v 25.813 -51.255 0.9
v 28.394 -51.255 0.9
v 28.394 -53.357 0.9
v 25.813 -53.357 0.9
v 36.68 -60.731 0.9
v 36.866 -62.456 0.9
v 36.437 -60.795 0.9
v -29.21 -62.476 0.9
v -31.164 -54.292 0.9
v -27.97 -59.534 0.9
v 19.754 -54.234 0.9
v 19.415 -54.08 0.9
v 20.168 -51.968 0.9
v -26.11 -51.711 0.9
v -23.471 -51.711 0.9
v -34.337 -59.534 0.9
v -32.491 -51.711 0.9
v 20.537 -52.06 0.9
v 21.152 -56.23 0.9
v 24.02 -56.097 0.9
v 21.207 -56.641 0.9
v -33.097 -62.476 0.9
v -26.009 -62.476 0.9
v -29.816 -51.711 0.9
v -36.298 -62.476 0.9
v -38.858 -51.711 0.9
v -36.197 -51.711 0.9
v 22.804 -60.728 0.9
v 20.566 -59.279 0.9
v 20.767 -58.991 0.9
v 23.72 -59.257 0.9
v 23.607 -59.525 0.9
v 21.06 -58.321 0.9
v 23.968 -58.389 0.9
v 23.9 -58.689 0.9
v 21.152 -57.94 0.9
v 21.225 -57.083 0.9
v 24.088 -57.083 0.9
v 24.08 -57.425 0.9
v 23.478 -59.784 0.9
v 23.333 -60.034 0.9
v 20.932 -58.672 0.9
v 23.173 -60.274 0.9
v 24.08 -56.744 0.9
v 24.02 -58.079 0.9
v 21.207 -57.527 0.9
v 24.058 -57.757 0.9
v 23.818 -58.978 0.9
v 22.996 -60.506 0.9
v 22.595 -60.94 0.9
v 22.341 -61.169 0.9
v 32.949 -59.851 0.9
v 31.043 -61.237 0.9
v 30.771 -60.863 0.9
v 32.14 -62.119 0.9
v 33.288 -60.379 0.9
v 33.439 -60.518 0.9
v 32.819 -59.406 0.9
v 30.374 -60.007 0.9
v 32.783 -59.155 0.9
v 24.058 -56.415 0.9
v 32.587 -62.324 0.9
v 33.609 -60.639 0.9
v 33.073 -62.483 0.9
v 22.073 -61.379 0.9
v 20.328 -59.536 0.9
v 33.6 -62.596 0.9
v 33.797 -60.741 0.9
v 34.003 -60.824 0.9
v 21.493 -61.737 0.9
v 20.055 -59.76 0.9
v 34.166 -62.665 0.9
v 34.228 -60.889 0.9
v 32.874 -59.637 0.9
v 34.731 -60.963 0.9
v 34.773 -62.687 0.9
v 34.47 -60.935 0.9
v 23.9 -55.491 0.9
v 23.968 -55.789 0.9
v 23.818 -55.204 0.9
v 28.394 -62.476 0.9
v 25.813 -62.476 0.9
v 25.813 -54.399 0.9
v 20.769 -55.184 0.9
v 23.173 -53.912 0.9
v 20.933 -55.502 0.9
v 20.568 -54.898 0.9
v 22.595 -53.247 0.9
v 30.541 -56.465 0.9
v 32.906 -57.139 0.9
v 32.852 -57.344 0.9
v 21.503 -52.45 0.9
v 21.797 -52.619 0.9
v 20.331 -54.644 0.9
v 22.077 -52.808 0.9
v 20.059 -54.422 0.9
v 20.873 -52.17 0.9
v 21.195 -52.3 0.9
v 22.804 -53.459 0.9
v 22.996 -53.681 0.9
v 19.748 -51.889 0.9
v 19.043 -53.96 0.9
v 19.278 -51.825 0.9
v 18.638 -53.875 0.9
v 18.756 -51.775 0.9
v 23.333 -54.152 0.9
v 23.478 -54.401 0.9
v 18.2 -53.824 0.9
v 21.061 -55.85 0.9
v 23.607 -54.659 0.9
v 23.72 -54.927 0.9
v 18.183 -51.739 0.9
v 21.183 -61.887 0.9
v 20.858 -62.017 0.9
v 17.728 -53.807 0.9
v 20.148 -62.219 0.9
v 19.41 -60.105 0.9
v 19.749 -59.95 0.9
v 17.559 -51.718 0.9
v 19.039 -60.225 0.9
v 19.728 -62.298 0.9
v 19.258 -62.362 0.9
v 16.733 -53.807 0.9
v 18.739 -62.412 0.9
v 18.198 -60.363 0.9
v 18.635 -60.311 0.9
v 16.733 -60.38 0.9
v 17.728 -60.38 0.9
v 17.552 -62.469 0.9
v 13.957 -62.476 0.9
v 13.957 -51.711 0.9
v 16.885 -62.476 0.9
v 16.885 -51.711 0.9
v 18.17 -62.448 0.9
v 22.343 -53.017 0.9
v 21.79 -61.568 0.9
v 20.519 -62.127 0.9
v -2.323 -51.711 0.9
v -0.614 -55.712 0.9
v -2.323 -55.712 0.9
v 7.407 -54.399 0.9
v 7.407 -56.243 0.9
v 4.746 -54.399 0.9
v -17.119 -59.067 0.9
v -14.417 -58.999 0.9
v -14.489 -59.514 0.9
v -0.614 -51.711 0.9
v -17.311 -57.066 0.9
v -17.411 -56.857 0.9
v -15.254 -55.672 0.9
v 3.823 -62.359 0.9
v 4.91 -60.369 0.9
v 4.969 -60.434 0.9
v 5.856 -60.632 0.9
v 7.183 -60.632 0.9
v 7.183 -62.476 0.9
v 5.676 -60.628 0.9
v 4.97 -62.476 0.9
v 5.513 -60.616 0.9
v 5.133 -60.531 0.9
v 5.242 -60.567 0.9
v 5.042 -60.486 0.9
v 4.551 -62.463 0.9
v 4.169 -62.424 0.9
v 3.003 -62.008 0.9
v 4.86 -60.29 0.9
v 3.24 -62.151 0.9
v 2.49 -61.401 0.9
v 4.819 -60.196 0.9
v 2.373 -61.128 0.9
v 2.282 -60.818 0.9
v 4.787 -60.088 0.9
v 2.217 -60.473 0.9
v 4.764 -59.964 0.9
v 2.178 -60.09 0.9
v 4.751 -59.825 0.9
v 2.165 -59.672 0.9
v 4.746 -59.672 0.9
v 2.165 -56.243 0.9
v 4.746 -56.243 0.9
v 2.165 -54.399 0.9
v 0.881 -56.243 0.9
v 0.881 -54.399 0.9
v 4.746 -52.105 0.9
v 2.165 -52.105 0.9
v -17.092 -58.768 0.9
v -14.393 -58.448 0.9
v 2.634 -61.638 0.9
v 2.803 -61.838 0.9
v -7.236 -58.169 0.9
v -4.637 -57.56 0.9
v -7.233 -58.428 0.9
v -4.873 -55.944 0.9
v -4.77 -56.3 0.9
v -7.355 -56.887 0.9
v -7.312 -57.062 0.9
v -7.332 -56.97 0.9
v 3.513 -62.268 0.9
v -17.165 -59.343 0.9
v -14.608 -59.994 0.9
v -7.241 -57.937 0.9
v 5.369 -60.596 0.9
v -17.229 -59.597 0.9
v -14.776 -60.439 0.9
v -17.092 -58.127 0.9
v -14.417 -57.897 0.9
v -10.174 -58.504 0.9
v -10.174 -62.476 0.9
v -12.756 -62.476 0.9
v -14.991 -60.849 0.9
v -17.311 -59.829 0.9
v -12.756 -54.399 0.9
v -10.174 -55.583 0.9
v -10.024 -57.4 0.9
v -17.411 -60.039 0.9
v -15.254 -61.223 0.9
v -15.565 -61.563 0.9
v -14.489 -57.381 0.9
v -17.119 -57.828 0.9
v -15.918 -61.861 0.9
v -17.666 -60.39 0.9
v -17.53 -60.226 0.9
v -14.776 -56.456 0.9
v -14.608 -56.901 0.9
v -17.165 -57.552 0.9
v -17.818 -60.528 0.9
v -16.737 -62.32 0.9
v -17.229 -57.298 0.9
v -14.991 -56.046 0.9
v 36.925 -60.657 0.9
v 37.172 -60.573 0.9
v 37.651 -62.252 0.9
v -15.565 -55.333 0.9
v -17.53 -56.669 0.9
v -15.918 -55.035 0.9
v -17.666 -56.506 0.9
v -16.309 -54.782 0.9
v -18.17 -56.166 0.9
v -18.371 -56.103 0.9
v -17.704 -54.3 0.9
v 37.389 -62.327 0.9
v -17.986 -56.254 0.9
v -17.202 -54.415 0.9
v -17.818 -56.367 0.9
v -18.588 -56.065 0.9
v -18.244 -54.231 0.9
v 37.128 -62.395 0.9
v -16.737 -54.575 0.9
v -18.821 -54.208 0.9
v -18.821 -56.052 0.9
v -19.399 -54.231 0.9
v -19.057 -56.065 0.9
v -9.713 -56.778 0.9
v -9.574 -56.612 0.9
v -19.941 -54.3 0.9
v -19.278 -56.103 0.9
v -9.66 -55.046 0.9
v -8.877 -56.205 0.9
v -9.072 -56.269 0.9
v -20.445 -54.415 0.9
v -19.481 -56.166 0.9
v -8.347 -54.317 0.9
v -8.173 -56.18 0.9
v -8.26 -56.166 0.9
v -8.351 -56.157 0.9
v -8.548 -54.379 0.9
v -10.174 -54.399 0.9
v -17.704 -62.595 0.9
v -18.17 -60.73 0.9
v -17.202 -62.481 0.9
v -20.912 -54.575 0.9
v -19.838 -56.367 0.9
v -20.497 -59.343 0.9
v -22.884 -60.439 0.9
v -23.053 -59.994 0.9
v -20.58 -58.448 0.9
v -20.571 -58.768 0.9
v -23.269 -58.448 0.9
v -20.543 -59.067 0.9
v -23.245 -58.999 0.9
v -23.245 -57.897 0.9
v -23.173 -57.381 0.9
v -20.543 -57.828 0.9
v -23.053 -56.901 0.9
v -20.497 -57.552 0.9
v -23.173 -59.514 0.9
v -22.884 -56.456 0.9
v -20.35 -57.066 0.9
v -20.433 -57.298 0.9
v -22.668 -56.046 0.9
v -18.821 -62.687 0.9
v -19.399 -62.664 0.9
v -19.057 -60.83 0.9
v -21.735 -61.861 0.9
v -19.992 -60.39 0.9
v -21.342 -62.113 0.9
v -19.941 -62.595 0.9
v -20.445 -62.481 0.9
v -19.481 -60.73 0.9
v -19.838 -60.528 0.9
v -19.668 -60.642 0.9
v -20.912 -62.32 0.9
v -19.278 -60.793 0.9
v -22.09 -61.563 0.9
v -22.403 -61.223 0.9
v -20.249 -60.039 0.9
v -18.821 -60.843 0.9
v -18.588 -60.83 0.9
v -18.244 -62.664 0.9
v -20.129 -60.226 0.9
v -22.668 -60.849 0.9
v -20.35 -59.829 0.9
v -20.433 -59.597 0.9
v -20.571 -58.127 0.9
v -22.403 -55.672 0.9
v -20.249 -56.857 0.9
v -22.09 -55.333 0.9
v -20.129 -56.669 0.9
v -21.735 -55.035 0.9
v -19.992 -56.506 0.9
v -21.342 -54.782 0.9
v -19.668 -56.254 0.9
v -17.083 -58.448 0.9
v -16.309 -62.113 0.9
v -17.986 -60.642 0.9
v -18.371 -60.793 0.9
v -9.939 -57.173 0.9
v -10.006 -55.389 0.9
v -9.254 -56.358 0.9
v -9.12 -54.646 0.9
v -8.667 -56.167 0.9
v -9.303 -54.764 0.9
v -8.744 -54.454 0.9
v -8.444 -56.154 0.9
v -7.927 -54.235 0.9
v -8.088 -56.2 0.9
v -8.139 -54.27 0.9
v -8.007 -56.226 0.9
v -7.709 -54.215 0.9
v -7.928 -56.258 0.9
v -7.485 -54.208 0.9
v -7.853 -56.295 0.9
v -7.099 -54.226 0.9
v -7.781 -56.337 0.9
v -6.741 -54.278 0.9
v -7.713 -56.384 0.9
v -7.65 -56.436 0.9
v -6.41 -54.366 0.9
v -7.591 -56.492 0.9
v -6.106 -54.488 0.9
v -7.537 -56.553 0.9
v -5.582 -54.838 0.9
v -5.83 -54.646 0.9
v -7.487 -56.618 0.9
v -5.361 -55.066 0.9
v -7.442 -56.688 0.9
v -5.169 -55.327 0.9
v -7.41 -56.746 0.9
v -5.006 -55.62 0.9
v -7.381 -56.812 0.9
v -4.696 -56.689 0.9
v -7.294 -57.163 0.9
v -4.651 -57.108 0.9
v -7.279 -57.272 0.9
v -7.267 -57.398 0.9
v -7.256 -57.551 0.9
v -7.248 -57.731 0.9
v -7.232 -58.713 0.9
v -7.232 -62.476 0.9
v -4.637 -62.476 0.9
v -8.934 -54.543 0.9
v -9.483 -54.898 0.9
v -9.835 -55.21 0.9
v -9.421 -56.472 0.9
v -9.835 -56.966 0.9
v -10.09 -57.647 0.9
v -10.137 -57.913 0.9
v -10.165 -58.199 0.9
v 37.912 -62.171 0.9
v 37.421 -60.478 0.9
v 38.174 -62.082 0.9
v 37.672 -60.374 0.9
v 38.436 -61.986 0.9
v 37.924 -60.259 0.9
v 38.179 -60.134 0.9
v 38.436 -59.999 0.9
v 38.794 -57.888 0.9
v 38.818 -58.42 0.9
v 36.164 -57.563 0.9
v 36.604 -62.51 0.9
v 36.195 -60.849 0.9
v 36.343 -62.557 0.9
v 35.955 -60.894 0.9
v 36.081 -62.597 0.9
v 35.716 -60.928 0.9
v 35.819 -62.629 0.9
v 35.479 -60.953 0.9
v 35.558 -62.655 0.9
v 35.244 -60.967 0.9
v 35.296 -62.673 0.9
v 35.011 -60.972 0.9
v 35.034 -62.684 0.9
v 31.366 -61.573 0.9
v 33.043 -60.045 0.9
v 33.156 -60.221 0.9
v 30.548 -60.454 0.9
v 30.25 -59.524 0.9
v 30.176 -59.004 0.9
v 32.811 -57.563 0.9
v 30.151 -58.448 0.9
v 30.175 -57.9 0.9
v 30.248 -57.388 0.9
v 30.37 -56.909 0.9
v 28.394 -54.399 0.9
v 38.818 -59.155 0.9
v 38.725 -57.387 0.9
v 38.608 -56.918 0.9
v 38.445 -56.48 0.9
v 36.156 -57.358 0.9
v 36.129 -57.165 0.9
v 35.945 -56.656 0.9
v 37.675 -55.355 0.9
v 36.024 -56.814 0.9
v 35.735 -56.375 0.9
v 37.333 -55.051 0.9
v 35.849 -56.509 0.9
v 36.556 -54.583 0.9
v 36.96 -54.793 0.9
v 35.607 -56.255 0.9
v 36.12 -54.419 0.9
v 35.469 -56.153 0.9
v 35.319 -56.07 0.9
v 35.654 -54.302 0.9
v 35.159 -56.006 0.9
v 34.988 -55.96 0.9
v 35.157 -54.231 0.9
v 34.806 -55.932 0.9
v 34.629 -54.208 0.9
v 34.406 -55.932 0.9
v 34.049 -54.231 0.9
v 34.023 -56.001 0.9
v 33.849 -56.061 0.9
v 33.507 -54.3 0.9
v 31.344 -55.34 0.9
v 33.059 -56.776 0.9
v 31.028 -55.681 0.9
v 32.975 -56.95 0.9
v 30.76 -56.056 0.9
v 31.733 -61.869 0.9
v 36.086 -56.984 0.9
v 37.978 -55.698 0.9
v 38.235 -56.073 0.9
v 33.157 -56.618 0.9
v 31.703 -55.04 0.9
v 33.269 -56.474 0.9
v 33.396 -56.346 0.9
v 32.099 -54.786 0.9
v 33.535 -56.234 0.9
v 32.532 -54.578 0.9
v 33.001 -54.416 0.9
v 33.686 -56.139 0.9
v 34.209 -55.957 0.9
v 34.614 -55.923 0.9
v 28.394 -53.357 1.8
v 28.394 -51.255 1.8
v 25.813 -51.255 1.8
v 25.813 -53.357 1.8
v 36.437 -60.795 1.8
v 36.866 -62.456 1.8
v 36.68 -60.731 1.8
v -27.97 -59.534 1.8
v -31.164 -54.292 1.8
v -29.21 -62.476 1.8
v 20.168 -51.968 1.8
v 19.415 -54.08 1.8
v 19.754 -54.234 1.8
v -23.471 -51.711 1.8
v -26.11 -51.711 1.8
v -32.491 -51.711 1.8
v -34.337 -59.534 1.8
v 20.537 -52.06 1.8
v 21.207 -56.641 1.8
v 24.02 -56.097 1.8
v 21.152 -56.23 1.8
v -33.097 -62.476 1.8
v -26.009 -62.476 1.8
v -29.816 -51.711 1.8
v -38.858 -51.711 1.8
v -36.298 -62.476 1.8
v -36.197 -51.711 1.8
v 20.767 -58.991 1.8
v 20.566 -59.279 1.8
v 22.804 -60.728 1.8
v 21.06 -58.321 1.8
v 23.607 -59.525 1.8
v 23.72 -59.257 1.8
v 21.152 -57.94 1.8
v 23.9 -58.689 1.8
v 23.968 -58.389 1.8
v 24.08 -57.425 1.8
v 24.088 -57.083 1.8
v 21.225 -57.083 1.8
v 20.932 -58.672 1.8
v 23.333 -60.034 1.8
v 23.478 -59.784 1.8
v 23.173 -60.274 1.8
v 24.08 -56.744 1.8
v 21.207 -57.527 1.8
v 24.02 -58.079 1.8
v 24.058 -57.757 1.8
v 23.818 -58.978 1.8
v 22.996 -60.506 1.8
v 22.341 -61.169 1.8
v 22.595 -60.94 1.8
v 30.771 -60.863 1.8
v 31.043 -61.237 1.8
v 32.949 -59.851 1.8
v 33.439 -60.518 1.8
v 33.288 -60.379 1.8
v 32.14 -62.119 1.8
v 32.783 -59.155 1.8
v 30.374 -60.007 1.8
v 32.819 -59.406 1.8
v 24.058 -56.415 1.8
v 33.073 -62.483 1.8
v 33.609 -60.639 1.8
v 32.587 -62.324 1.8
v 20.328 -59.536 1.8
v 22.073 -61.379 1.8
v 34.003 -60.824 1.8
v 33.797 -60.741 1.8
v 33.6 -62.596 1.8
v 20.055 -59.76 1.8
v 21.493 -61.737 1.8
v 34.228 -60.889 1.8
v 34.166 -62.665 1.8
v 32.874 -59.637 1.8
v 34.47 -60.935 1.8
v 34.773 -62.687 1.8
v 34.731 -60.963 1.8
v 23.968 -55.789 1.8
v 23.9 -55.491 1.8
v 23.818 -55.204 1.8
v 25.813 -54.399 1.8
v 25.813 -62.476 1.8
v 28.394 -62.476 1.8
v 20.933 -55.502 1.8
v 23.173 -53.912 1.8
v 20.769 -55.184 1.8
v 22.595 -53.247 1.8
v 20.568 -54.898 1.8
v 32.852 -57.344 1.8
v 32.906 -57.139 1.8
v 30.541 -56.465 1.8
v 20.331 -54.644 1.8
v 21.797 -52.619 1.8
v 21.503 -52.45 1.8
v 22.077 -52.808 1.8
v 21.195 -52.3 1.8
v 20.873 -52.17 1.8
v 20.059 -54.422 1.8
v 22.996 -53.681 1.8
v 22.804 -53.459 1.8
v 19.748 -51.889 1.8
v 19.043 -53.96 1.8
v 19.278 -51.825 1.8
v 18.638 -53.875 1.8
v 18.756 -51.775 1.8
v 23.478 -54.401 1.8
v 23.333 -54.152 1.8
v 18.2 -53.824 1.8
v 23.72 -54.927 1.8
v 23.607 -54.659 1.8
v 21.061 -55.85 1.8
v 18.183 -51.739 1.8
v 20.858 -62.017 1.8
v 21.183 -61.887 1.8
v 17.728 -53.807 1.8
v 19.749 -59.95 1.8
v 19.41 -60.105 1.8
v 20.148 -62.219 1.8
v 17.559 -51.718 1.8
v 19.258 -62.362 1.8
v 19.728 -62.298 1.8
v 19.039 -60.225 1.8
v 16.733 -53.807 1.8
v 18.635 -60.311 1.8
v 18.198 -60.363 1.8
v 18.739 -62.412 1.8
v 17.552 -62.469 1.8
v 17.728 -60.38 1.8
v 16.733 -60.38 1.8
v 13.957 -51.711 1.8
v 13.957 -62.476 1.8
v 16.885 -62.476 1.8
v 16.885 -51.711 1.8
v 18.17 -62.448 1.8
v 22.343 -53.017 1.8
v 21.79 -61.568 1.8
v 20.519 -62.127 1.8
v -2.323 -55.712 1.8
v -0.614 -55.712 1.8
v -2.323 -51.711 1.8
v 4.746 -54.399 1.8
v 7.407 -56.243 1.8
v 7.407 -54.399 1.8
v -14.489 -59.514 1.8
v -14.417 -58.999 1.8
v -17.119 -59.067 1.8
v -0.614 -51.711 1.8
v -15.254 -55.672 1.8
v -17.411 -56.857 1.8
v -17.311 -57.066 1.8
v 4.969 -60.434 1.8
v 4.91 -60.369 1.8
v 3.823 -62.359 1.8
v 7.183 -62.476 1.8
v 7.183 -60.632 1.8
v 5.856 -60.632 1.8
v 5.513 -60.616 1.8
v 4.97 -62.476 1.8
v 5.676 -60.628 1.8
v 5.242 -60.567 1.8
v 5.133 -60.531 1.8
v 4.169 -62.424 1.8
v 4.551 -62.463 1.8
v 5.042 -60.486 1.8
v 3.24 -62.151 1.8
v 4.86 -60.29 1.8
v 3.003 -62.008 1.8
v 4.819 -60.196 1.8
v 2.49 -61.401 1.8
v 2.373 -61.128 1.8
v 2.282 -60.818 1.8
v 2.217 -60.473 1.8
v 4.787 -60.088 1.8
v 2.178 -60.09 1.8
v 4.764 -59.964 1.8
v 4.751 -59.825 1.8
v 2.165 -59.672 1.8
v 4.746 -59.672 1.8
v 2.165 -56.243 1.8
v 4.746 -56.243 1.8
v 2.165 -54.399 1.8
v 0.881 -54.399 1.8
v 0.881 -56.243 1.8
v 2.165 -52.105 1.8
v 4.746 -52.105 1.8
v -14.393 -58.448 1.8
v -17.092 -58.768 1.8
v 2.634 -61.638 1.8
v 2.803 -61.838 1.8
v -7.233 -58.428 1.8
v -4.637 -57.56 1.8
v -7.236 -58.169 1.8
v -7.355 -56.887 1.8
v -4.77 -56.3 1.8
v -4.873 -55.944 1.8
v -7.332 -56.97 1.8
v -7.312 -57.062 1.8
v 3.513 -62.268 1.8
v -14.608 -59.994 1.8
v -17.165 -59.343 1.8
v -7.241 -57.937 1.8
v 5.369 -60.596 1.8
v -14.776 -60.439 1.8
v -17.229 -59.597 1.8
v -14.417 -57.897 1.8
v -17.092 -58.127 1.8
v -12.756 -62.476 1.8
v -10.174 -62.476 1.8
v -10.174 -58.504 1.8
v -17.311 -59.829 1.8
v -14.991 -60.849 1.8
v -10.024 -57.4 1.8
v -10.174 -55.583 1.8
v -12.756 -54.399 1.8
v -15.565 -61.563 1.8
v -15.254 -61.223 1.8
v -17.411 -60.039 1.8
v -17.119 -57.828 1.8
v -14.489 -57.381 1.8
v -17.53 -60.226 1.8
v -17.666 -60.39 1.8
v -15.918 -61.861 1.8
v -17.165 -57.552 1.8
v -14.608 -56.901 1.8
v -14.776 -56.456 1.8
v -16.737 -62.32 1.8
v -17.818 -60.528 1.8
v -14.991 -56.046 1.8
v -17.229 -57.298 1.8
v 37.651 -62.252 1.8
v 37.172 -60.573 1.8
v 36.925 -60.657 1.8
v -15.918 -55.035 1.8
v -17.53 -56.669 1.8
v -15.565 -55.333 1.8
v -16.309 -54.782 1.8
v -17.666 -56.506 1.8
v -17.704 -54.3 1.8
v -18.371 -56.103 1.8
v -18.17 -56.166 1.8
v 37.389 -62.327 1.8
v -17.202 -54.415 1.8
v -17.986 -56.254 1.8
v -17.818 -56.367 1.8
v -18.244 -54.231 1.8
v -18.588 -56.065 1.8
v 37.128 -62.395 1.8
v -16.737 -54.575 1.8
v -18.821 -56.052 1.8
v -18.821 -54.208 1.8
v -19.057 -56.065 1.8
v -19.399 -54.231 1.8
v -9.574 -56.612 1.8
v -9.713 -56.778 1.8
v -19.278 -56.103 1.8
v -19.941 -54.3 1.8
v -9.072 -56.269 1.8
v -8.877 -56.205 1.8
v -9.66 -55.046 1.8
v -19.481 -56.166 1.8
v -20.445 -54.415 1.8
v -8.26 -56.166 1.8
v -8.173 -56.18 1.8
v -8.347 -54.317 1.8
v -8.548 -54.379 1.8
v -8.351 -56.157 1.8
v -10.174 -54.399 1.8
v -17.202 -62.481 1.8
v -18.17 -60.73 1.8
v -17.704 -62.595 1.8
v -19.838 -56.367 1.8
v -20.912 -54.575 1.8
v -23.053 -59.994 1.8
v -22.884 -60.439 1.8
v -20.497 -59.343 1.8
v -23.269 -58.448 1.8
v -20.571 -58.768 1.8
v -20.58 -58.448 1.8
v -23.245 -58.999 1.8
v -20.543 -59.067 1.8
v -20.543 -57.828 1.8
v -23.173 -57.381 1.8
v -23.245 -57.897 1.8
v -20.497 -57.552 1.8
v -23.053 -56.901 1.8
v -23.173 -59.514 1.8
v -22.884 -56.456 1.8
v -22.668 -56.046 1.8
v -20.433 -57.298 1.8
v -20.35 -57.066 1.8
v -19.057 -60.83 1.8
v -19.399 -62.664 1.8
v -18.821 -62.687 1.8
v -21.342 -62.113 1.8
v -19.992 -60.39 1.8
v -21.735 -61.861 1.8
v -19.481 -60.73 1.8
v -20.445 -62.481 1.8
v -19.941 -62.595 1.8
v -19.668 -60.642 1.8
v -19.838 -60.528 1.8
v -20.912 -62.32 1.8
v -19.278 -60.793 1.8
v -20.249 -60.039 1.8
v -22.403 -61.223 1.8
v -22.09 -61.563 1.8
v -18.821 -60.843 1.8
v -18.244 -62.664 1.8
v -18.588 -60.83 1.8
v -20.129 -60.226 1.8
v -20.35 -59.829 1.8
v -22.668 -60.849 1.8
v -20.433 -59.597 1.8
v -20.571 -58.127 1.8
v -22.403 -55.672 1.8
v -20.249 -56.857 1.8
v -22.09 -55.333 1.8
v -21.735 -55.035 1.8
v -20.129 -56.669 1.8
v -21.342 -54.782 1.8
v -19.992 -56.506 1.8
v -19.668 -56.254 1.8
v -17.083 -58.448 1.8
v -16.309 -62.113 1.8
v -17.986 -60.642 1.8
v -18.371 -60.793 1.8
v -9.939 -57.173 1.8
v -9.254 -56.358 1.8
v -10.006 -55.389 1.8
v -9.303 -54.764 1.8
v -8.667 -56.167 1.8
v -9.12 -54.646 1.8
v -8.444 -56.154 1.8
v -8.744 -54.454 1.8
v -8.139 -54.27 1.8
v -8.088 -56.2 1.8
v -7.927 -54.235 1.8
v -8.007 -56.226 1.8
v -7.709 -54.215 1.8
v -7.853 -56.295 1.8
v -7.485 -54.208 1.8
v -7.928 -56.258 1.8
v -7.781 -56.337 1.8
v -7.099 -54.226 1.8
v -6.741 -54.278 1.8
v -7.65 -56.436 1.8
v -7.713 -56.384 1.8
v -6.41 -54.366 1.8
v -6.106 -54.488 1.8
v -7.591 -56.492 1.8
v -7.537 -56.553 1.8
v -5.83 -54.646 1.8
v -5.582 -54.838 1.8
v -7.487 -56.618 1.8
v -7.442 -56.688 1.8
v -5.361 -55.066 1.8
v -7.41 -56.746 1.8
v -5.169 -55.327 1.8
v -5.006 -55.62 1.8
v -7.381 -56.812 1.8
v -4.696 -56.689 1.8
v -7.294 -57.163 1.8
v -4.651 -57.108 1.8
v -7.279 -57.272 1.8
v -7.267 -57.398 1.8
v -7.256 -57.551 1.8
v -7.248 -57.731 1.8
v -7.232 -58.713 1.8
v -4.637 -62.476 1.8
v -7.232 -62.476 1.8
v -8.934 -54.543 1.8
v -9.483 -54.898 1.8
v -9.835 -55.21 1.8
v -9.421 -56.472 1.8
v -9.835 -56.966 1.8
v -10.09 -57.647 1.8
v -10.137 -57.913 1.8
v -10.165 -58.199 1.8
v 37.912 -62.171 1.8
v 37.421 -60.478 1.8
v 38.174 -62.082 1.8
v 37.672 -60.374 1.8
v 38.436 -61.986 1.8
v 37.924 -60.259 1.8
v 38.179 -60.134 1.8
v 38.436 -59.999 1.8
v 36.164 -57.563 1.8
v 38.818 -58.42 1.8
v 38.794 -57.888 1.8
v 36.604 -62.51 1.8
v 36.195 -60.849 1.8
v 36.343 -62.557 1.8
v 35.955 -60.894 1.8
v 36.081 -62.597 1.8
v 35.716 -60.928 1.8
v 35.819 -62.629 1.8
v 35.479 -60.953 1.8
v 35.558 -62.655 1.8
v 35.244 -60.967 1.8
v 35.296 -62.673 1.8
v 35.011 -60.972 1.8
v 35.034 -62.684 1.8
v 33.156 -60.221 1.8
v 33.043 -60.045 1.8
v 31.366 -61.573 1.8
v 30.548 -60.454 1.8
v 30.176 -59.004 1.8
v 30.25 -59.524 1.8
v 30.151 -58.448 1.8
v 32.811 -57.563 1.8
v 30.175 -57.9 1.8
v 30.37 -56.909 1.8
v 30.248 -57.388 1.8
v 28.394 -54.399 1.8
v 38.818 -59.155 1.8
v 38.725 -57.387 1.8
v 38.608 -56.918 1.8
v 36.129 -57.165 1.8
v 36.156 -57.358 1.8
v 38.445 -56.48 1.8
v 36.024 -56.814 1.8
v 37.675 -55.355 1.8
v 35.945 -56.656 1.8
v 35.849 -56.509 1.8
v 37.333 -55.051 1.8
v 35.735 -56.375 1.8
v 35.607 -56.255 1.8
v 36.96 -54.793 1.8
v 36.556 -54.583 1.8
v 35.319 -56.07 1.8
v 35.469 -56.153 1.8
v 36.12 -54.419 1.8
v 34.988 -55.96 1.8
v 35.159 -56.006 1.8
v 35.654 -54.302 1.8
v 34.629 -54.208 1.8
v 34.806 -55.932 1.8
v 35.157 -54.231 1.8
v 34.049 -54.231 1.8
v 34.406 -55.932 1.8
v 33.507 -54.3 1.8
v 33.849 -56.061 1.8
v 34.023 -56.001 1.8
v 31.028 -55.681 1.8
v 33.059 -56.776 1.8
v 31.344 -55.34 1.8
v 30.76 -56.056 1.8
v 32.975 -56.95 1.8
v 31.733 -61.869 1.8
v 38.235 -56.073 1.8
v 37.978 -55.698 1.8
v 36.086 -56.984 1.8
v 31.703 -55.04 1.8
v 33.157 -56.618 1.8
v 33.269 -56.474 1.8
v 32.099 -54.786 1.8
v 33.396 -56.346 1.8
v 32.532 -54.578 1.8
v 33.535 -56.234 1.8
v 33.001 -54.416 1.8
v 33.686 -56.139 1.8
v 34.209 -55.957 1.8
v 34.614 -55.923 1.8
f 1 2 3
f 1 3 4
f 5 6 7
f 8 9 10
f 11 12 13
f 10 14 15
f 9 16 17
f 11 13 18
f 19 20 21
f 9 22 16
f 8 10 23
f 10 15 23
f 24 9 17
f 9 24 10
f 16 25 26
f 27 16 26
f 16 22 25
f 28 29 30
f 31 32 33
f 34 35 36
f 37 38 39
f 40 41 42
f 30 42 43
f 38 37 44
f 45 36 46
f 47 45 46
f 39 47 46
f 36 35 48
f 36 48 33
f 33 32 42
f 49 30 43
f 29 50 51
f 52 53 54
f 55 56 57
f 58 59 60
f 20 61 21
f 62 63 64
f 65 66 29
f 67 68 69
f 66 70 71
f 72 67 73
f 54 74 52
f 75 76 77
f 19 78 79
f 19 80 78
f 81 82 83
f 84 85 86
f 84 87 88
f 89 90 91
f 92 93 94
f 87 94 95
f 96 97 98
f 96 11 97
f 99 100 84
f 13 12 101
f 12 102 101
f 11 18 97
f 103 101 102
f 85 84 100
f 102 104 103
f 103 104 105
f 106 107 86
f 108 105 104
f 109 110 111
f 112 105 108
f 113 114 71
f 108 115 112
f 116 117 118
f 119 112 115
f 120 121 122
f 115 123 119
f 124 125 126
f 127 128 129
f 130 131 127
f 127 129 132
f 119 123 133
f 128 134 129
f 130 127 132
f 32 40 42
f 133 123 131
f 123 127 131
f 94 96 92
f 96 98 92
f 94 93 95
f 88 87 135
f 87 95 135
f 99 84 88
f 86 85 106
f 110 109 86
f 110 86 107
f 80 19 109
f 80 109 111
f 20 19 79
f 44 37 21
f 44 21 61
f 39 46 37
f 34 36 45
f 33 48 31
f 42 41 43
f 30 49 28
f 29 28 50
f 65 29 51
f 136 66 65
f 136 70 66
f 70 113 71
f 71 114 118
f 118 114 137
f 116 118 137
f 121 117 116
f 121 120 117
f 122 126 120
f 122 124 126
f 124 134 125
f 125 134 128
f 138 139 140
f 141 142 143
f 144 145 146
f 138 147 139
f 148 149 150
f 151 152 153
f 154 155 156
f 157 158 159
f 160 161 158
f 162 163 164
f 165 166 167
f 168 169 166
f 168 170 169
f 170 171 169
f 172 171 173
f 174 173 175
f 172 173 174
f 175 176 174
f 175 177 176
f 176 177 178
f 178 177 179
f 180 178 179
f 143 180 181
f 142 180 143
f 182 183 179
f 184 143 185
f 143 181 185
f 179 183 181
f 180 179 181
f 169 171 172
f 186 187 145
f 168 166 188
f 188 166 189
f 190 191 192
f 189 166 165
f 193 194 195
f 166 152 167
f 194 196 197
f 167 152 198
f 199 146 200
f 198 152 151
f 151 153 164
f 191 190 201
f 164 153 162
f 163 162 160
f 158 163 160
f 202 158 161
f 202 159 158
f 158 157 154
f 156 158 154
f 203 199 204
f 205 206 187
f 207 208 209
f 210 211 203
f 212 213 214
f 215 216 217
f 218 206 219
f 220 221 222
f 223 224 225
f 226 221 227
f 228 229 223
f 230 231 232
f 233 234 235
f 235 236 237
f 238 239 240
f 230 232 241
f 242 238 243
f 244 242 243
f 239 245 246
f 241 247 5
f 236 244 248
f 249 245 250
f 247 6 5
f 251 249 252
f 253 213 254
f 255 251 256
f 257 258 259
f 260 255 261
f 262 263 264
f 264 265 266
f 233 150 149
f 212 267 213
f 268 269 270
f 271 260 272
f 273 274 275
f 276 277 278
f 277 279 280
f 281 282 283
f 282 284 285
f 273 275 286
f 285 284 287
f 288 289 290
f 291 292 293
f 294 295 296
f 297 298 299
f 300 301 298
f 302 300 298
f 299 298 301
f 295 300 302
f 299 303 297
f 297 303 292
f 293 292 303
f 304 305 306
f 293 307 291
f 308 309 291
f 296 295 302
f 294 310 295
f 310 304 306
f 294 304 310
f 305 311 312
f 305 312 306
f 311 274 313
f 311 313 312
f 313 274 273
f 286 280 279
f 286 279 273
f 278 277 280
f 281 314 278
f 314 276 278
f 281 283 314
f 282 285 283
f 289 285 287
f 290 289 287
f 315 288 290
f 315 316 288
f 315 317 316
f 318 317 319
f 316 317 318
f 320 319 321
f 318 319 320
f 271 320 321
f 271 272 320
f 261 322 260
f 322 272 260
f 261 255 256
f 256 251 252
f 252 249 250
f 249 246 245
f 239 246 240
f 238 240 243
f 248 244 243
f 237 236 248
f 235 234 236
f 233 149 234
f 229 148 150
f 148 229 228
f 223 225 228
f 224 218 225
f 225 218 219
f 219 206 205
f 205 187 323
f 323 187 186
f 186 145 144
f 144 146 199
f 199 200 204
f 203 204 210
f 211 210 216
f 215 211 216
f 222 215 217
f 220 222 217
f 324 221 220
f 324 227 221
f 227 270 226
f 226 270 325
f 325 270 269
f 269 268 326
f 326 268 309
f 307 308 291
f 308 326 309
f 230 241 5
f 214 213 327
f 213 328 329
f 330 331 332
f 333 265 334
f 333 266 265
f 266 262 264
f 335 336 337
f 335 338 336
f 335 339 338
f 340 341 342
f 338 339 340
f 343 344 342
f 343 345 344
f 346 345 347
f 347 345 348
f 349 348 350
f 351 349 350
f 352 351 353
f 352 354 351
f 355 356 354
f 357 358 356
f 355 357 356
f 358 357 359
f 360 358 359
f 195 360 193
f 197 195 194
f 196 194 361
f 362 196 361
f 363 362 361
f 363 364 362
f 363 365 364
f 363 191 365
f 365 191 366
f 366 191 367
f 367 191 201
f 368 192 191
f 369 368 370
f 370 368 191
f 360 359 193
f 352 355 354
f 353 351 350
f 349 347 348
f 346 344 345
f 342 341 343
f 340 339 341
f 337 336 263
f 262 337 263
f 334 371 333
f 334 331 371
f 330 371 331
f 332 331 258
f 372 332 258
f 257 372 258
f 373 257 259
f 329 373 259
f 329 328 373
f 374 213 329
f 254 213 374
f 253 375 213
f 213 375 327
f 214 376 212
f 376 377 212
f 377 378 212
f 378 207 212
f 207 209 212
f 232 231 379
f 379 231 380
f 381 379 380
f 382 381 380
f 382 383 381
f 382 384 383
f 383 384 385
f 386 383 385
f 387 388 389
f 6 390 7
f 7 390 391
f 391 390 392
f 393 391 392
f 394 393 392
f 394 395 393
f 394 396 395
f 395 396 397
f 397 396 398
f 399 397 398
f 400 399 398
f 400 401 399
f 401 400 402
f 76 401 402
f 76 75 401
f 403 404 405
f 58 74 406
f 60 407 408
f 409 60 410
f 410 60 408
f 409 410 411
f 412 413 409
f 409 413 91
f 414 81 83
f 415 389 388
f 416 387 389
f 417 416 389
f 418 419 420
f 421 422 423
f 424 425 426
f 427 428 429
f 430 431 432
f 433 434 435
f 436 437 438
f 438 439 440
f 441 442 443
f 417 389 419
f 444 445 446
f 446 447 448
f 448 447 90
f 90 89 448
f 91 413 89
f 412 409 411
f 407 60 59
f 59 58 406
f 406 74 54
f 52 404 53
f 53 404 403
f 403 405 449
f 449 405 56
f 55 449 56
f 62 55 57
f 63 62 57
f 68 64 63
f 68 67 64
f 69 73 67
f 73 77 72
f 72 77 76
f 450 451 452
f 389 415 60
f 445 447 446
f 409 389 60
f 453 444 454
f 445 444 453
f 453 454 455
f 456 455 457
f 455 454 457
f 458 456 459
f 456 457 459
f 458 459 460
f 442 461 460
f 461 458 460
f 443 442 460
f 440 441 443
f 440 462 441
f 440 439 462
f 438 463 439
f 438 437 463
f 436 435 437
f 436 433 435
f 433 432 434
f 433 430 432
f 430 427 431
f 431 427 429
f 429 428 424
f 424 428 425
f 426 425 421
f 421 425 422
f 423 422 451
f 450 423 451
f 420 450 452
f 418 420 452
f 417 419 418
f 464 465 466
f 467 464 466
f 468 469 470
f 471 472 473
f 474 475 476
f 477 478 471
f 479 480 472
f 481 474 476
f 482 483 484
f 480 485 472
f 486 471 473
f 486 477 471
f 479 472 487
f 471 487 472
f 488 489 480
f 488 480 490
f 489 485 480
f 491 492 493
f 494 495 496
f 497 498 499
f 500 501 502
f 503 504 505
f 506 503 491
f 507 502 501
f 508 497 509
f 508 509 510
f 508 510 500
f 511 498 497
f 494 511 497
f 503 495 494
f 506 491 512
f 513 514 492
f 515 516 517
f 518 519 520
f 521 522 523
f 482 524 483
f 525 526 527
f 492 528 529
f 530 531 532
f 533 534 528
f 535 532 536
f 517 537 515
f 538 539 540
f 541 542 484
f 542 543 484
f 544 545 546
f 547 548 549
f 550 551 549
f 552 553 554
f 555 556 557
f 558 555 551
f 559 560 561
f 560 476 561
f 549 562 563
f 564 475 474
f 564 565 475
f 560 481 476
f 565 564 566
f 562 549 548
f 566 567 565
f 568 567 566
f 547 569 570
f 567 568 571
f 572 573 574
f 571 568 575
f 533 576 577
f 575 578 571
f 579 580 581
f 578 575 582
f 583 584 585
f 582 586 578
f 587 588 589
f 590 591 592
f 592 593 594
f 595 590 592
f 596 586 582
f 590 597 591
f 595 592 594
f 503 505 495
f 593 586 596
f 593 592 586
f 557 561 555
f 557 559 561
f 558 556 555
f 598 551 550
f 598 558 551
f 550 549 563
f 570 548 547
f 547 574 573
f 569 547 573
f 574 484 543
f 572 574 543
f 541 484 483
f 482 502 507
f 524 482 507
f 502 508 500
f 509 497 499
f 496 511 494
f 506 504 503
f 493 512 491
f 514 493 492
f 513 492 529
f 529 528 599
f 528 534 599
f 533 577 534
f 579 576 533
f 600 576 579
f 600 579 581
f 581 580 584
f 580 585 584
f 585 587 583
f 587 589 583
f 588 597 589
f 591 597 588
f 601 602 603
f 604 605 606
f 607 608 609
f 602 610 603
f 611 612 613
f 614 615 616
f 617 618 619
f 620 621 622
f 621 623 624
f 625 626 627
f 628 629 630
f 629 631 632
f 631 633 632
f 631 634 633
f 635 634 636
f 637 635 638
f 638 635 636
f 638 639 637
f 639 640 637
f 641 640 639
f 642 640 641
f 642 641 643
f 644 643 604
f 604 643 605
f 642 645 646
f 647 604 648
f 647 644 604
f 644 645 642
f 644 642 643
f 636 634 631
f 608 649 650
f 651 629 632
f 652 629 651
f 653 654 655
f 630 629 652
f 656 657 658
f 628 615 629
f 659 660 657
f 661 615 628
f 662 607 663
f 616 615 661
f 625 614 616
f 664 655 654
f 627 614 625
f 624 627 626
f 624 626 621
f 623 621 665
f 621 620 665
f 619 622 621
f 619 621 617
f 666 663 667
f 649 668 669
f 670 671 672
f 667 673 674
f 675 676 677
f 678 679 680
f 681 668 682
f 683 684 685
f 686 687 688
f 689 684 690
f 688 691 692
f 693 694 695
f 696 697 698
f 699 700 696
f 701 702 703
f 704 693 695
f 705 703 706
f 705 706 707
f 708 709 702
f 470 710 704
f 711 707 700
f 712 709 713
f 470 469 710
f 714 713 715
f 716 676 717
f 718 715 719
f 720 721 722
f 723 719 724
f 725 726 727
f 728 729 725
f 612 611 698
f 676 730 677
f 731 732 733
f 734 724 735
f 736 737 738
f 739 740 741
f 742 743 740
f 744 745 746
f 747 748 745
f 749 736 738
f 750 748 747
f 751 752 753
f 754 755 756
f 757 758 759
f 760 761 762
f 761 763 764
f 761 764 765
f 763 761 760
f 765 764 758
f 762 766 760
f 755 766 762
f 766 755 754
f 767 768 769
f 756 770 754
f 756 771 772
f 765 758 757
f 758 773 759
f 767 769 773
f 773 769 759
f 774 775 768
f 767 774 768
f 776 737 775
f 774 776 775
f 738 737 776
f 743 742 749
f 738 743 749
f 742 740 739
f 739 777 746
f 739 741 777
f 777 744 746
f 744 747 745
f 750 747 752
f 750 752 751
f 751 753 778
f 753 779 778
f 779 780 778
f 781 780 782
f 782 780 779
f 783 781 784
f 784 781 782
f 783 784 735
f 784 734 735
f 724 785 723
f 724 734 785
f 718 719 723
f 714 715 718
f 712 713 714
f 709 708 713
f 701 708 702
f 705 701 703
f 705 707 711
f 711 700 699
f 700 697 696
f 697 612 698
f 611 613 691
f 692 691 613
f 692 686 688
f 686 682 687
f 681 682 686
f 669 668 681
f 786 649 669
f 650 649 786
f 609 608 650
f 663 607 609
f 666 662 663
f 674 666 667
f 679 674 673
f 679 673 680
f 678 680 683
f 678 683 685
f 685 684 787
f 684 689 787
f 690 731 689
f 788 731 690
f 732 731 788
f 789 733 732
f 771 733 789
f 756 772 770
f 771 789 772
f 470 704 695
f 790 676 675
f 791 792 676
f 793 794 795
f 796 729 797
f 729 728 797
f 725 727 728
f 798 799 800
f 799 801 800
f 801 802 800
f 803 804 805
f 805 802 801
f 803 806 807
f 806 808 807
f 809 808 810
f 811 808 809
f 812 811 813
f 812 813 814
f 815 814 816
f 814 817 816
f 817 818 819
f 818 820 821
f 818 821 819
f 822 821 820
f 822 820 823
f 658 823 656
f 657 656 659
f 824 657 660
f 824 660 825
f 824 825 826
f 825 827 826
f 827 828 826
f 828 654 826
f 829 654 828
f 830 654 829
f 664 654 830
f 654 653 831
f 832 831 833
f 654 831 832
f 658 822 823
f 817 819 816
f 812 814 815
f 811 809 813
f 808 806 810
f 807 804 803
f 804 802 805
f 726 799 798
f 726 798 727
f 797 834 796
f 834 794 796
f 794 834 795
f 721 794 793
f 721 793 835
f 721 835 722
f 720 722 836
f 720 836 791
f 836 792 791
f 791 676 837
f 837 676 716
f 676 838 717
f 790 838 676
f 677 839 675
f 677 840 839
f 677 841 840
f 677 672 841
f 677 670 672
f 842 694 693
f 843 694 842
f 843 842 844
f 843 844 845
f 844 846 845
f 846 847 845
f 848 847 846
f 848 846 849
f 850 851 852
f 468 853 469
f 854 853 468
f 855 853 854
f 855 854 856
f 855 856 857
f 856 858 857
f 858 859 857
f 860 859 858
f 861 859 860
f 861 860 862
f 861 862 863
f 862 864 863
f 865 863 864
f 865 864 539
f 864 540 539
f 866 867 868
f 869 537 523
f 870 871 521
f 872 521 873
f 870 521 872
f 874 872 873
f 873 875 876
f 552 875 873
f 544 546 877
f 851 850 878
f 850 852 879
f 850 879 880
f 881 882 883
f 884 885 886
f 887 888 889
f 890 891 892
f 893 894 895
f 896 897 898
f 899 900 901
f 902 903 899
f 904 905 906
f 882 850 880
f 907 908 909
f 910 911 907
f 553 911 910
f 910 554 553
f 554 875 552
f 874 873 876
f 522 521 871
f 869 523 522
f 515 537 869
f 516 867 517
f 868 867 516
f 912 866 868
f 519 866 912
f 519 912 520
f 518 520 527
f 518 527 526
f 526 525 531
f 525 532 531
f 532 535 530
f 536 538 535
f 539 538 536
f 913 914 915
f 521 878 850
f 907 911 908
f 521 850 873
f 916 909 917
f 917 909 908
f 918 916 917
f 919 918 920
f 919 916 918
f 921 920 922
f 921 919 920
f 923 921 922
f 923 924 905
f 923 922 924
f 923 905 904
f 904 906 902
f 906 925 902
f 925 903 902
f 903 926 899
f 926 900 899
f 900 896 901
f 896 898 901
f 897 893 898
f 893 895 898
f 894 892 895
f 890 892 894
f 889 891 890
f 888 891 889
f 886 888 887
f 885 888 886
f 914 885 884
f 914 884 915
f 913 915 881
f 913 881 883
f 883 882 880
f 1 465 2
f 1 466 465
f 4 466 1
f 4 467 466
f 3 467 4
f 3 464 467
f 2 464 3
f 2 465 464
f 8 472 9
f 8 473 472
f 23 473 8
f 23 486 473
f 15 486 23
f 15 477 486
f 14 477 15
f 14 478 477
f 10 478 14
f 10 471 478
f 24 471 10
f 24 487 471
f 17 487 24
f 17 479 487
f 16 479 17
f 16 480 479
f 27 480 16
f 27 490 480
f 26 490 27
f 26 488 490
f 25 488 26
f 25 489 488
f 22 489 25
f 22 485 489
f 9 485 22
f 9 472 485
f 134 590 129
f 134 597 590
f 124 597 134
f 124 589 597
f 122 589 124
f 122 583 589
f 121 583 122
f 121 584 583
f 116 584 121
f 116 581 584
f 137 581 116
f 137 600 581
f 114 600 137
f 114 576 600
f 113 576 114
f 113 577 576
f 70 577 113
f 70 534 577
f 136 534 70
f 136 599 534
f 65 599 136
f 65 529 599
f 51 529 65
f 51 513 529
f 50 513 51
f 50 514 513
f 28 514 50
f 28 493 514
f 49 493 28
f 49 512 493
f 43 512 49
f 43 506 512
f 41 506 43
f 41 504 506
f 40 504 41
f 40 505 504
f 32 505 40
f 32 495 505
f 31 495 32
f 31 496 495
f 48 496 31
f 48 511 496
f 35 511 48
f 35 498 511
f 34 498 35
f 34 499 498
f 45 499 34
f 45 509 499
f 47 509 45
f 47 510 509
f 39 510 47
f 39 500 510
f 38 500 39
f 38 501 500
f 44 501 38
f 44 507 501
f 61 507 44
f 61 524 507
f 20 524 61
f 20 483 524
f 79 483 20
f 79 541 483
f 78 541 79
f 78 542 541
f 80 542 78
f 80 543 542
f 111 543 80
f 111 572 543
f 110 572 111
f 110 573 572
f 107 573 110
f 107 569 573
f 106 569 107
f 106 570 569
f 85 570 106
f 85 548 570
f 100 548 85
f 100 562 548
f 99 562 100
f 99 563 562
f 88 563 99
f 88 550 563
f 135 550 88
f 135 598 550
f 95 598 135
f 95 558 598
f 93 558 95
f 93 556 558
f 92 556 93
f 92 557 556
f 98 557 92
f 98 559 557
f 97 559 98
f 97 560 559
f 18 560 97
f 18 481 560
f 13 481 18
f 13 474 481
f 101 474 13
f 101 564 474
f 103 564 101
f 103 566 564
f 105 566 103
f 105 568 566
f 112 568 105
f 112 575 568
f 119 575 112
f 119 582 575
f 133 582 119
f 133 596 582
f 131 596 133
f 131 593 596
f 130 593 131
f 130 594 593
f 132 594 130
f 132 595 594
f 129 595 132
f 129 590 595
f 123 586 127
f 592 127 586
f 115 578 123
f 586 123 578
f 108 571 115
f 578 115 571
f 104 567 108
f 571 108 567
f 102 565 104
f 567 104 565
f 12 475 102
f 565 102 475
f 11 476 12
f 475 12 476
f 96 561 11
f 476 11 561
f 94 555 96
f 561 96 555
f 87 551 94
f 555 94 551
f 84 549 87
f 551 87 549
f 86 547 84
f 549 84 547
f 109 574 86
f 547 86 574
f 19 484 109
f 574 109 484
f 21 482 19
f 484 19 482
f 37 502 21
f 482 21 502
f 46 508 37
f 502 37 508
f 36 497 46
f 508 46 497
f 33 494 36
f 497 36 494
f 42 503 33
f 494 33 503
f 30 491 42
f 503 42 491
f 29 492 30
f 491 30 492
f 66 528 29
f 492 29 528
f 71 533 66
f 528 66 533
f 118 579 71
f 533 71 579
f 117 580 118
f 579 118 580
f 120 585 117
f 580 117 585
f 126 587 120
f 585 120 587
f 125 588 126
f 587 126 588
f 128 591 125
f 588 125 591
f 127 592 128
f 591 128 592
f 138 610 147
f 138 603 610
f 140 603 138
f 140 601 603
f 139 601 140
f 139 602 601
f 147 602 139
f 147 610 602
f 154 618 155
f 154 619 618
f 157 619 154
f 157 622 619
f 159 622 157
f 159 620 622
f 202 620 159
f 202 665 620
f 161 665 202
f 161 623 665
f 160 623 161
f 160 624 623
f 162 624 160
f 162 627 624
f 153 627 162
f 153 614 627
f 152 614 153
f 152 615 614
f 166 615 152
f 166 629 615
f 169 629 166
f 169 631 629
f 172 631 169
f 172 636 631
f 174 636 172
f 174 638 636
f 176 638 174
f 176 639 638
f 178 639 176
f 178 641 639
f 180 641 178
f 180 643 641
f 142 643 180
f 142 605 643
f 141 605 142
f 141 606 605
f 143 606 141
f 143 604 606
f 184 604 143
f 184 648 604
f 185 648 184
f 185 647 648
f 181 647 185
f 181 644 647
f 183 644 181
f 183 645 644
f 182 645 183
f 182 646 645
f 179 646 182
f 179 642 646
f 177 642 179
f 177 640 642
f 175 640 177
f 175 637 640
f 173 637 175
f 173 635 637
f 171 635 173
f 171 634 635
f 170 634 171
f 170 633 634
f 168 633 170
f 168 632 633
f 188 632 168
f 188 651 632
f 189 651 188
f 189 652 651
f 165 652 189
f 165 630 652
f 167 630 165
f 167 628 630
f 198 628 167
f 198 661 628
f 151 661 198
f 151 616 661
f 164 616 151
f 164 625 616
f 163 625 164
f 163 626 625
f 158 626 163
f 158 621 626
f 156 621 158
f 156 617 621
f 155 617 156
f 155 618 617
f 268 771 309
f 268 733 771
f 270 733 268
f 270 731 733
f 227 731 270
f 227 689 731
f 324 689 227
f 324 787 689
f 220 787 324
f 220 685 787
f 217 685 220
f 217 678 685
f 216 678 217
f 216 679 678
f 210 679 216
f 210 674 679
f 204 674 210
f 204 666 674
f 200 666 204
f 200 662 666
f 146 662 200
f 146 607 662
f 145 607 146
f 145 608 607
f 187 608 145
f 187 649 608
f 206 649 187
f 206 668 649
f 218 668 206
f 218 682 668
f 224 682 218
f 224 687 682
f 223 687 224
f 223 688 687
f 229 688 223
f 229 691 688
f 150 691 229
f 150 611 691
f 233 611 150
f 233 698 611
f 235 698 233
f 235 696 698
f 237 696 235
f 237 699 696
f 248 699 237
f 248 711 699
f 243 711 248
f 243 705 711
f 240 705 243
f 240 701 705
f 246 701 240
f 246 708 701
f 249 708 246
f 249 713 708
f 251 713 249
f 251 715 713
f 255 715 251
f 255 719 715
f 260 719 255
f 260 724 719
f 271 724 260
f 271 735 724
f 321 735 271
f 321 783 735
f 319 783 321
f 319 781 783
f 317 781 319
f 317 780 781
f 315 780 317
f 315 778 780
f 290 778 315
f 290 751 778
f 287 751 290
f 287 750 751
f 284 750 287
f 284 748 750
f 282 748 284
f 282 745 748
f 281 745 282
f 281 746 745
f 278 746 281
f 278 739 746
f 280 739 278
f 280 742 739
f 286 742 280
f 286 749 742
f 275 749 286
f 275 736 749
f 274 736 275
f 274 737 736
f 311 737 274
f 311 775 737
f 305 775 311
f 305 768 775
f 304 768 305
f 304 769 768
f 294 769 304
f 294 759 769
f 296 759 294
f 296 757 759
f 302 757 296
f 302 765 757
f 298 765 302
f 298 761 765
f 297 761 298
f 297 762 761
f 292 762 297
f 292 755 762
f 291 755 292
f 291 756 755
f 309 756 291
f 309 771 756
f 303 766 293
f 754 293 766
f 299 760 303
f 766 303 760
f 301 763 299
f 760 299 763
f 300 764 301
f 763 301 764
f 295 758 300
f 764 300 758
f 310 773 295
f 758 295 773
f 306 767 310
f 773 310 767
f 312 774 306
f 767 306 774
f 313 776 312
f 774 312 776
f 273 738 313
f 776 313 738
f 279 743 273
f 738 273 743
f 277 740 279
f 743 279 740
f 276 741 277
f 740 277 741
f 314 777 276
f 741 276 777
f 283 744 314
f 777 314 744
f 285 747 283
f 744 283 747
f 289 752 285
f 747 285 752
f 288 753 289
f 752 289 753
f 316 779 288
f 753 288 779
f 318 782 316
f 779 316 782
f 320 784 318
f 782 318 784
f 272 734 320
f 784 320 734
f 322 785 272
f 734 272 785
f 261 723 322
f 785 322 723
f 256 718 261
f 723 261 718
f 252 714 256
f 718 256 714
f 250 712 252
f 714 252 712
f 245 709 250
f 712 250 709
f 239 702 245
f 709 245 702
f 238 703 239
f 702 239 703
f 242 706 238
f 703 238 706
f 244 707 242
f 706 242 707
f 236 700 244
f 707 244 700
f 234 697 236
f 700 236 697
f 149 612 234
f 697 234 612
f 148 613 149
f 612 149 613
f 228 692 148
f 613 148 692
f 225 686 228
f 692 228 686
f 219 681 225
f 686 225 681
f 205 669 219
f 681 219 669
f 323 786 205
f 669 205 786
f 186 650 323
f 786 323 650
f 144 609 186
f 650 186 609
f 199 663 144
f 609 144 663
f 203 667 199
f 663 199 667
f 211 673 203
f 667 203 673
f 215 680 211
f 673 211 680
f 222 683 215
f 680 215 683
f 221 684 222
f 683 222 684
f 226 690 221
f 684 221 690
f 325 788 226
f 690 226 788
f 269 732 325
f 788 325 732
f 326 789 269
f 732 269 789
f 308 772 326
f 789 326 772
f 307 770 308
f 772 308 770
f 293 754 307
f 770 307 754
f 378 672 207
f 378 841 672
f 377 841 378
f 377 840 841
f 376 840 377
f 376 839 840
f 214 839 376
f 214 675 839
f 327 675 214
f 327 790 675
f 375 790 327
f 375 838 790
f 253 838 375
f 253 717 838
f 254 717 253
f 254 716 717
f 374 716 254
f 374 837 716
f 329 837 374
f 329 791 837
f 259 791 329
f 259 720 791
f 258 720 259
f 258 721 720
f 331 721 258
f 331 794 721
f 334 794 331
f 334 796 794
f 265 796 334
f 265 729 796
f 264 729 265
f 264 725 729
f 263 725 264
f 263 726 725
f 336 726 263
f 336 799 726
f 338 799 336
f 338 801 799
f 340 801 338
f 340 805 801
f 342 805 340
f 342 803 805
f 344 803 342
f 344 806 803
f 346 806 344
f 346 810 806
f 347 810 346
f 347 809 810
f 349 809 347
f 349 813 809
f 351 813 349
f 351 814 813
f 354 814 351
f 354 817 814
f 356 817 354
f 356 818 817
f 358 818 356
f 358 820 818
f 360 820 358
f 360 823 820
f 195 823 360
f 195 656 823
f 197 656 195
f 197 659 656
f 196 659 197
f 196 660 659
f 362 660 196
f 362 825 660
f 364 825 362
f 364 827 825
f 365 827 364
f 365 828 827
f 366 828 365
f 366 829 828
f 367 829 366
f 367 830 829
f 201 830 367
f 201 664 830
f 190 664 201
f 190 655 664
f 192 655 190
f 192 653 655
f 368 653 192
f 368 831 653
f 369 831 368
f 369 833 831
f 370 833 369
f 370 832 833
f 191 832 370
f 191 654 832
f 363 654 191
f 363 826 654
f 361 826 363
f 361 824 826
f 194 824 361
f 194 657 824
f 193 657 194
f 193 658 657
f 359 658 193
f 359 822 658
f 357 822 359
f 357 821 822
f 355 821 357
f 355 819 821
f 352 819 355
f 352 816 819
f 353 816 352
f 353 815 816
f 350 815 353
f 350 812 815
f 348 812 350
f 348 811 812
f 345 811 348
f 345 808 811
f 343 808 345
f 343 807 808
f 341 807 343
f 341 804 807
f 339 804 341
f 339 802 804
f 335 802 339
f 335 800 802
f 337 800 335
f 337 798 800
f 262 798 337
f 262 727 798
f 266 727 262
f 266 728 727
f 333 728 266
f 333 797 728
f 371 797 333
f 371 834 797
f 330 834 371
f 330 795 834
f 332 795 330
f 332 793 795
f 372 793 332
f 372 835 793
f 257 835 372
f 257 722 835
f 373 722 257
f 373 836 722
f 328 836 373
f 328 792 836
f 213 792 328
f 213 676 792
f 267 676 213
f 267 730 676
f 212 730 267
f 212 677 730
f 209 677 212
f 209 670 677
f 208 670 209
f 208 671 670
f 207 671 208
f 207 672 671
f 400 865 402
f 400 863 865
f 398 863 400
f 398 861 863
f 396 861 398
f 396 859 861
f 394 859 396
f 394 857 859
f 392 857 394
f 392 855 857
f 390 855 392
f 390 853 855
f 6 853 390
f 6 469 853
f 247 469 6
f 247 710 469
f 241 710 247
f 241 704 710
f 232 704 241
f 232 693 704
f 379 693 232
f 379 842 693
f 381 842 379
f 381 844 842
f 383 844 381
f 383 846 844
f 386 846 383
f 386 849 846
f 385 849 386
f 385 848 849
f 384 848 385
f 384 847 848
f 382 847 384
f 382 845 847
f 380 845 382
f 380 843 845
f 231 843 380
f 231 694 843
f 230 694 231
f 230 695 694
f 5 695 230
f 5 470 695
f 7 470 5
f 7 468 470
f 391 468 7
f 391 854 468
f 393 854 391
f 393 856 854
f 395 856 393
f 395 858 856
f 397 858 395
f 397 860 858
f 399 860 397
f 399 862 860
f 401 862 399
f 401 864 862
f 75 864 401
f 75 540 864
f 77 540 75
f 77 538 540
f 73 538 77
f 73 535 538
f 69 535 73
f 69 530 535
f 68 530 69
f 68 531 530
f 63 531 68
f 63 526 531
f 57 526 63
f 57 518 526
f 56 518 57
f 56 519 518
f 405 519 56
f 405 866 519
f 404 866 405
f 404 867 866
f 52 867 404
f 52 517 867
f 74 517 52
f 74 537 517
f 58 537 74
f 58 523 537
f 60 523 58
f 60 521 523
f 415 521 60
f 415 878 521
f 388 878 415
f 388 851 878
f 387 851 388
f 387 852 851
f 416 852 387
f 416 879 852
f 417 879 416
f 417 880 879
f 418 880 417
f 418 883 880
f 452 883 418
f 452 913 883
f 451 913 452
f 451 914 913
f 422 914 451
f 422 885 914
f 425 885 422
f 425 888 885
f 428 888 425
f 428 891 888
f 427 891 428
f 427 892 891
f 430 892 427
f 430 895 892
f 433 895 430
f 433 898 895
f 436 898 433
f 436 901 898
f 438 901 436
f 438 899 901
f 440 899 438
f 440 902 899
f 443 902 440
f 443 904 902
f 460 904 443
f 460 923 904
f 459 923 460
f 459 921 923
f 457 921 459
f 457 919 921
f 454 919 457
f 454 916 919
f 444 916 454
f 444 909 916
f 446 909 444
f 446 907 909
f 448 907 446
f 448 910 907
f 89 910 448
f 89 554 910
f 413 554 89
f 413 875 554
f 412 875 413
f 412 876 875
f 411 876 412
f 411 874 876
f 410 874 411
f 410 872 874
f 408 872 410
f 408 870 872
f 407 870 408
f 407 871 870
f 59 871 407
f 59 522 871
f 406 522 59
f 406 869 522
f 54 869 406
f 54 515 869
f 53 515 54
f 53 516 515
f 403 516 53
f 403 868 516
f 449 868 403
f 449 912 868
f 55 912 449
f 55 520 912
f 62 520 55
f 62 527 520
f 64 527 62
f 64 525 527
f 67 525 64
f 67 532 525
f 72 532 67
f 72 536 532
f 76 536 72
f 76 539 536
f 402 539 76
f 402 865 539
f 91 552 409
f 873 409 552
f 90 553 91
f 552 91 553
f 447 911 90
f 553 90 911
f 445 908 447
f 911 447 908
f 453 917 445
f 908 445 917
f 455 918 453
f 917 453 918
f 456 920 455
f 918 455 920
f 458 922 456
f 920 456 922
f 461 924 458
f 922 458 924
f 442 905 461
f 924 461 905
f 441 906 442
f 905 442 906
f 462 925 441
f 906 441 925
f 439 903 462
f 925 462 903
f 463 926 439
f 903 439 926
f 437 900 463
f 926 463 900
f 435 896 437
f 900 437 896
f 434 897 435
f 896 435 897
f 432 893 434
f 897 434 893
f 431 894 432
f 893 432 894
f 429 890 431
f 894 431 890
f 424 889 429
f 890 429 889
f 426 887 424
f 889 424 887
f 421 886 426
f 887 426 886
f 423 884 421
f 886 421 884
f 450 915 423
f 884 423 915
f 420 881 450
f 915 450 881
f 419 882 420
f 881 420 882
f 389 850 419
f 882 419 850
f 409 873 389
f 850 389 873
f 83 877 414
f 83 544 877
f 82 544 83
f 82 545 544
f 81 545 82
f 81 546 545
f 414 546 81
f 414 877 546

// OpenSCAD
$fn = 48;
  // English (below bottom hole)
  translate([0, -57.100, 0.900]) linear_extrude(height=0.900) text("Won't Die", size=10.633, halign="center", valign="center", font="Helvetica Neue:style=Bold");
